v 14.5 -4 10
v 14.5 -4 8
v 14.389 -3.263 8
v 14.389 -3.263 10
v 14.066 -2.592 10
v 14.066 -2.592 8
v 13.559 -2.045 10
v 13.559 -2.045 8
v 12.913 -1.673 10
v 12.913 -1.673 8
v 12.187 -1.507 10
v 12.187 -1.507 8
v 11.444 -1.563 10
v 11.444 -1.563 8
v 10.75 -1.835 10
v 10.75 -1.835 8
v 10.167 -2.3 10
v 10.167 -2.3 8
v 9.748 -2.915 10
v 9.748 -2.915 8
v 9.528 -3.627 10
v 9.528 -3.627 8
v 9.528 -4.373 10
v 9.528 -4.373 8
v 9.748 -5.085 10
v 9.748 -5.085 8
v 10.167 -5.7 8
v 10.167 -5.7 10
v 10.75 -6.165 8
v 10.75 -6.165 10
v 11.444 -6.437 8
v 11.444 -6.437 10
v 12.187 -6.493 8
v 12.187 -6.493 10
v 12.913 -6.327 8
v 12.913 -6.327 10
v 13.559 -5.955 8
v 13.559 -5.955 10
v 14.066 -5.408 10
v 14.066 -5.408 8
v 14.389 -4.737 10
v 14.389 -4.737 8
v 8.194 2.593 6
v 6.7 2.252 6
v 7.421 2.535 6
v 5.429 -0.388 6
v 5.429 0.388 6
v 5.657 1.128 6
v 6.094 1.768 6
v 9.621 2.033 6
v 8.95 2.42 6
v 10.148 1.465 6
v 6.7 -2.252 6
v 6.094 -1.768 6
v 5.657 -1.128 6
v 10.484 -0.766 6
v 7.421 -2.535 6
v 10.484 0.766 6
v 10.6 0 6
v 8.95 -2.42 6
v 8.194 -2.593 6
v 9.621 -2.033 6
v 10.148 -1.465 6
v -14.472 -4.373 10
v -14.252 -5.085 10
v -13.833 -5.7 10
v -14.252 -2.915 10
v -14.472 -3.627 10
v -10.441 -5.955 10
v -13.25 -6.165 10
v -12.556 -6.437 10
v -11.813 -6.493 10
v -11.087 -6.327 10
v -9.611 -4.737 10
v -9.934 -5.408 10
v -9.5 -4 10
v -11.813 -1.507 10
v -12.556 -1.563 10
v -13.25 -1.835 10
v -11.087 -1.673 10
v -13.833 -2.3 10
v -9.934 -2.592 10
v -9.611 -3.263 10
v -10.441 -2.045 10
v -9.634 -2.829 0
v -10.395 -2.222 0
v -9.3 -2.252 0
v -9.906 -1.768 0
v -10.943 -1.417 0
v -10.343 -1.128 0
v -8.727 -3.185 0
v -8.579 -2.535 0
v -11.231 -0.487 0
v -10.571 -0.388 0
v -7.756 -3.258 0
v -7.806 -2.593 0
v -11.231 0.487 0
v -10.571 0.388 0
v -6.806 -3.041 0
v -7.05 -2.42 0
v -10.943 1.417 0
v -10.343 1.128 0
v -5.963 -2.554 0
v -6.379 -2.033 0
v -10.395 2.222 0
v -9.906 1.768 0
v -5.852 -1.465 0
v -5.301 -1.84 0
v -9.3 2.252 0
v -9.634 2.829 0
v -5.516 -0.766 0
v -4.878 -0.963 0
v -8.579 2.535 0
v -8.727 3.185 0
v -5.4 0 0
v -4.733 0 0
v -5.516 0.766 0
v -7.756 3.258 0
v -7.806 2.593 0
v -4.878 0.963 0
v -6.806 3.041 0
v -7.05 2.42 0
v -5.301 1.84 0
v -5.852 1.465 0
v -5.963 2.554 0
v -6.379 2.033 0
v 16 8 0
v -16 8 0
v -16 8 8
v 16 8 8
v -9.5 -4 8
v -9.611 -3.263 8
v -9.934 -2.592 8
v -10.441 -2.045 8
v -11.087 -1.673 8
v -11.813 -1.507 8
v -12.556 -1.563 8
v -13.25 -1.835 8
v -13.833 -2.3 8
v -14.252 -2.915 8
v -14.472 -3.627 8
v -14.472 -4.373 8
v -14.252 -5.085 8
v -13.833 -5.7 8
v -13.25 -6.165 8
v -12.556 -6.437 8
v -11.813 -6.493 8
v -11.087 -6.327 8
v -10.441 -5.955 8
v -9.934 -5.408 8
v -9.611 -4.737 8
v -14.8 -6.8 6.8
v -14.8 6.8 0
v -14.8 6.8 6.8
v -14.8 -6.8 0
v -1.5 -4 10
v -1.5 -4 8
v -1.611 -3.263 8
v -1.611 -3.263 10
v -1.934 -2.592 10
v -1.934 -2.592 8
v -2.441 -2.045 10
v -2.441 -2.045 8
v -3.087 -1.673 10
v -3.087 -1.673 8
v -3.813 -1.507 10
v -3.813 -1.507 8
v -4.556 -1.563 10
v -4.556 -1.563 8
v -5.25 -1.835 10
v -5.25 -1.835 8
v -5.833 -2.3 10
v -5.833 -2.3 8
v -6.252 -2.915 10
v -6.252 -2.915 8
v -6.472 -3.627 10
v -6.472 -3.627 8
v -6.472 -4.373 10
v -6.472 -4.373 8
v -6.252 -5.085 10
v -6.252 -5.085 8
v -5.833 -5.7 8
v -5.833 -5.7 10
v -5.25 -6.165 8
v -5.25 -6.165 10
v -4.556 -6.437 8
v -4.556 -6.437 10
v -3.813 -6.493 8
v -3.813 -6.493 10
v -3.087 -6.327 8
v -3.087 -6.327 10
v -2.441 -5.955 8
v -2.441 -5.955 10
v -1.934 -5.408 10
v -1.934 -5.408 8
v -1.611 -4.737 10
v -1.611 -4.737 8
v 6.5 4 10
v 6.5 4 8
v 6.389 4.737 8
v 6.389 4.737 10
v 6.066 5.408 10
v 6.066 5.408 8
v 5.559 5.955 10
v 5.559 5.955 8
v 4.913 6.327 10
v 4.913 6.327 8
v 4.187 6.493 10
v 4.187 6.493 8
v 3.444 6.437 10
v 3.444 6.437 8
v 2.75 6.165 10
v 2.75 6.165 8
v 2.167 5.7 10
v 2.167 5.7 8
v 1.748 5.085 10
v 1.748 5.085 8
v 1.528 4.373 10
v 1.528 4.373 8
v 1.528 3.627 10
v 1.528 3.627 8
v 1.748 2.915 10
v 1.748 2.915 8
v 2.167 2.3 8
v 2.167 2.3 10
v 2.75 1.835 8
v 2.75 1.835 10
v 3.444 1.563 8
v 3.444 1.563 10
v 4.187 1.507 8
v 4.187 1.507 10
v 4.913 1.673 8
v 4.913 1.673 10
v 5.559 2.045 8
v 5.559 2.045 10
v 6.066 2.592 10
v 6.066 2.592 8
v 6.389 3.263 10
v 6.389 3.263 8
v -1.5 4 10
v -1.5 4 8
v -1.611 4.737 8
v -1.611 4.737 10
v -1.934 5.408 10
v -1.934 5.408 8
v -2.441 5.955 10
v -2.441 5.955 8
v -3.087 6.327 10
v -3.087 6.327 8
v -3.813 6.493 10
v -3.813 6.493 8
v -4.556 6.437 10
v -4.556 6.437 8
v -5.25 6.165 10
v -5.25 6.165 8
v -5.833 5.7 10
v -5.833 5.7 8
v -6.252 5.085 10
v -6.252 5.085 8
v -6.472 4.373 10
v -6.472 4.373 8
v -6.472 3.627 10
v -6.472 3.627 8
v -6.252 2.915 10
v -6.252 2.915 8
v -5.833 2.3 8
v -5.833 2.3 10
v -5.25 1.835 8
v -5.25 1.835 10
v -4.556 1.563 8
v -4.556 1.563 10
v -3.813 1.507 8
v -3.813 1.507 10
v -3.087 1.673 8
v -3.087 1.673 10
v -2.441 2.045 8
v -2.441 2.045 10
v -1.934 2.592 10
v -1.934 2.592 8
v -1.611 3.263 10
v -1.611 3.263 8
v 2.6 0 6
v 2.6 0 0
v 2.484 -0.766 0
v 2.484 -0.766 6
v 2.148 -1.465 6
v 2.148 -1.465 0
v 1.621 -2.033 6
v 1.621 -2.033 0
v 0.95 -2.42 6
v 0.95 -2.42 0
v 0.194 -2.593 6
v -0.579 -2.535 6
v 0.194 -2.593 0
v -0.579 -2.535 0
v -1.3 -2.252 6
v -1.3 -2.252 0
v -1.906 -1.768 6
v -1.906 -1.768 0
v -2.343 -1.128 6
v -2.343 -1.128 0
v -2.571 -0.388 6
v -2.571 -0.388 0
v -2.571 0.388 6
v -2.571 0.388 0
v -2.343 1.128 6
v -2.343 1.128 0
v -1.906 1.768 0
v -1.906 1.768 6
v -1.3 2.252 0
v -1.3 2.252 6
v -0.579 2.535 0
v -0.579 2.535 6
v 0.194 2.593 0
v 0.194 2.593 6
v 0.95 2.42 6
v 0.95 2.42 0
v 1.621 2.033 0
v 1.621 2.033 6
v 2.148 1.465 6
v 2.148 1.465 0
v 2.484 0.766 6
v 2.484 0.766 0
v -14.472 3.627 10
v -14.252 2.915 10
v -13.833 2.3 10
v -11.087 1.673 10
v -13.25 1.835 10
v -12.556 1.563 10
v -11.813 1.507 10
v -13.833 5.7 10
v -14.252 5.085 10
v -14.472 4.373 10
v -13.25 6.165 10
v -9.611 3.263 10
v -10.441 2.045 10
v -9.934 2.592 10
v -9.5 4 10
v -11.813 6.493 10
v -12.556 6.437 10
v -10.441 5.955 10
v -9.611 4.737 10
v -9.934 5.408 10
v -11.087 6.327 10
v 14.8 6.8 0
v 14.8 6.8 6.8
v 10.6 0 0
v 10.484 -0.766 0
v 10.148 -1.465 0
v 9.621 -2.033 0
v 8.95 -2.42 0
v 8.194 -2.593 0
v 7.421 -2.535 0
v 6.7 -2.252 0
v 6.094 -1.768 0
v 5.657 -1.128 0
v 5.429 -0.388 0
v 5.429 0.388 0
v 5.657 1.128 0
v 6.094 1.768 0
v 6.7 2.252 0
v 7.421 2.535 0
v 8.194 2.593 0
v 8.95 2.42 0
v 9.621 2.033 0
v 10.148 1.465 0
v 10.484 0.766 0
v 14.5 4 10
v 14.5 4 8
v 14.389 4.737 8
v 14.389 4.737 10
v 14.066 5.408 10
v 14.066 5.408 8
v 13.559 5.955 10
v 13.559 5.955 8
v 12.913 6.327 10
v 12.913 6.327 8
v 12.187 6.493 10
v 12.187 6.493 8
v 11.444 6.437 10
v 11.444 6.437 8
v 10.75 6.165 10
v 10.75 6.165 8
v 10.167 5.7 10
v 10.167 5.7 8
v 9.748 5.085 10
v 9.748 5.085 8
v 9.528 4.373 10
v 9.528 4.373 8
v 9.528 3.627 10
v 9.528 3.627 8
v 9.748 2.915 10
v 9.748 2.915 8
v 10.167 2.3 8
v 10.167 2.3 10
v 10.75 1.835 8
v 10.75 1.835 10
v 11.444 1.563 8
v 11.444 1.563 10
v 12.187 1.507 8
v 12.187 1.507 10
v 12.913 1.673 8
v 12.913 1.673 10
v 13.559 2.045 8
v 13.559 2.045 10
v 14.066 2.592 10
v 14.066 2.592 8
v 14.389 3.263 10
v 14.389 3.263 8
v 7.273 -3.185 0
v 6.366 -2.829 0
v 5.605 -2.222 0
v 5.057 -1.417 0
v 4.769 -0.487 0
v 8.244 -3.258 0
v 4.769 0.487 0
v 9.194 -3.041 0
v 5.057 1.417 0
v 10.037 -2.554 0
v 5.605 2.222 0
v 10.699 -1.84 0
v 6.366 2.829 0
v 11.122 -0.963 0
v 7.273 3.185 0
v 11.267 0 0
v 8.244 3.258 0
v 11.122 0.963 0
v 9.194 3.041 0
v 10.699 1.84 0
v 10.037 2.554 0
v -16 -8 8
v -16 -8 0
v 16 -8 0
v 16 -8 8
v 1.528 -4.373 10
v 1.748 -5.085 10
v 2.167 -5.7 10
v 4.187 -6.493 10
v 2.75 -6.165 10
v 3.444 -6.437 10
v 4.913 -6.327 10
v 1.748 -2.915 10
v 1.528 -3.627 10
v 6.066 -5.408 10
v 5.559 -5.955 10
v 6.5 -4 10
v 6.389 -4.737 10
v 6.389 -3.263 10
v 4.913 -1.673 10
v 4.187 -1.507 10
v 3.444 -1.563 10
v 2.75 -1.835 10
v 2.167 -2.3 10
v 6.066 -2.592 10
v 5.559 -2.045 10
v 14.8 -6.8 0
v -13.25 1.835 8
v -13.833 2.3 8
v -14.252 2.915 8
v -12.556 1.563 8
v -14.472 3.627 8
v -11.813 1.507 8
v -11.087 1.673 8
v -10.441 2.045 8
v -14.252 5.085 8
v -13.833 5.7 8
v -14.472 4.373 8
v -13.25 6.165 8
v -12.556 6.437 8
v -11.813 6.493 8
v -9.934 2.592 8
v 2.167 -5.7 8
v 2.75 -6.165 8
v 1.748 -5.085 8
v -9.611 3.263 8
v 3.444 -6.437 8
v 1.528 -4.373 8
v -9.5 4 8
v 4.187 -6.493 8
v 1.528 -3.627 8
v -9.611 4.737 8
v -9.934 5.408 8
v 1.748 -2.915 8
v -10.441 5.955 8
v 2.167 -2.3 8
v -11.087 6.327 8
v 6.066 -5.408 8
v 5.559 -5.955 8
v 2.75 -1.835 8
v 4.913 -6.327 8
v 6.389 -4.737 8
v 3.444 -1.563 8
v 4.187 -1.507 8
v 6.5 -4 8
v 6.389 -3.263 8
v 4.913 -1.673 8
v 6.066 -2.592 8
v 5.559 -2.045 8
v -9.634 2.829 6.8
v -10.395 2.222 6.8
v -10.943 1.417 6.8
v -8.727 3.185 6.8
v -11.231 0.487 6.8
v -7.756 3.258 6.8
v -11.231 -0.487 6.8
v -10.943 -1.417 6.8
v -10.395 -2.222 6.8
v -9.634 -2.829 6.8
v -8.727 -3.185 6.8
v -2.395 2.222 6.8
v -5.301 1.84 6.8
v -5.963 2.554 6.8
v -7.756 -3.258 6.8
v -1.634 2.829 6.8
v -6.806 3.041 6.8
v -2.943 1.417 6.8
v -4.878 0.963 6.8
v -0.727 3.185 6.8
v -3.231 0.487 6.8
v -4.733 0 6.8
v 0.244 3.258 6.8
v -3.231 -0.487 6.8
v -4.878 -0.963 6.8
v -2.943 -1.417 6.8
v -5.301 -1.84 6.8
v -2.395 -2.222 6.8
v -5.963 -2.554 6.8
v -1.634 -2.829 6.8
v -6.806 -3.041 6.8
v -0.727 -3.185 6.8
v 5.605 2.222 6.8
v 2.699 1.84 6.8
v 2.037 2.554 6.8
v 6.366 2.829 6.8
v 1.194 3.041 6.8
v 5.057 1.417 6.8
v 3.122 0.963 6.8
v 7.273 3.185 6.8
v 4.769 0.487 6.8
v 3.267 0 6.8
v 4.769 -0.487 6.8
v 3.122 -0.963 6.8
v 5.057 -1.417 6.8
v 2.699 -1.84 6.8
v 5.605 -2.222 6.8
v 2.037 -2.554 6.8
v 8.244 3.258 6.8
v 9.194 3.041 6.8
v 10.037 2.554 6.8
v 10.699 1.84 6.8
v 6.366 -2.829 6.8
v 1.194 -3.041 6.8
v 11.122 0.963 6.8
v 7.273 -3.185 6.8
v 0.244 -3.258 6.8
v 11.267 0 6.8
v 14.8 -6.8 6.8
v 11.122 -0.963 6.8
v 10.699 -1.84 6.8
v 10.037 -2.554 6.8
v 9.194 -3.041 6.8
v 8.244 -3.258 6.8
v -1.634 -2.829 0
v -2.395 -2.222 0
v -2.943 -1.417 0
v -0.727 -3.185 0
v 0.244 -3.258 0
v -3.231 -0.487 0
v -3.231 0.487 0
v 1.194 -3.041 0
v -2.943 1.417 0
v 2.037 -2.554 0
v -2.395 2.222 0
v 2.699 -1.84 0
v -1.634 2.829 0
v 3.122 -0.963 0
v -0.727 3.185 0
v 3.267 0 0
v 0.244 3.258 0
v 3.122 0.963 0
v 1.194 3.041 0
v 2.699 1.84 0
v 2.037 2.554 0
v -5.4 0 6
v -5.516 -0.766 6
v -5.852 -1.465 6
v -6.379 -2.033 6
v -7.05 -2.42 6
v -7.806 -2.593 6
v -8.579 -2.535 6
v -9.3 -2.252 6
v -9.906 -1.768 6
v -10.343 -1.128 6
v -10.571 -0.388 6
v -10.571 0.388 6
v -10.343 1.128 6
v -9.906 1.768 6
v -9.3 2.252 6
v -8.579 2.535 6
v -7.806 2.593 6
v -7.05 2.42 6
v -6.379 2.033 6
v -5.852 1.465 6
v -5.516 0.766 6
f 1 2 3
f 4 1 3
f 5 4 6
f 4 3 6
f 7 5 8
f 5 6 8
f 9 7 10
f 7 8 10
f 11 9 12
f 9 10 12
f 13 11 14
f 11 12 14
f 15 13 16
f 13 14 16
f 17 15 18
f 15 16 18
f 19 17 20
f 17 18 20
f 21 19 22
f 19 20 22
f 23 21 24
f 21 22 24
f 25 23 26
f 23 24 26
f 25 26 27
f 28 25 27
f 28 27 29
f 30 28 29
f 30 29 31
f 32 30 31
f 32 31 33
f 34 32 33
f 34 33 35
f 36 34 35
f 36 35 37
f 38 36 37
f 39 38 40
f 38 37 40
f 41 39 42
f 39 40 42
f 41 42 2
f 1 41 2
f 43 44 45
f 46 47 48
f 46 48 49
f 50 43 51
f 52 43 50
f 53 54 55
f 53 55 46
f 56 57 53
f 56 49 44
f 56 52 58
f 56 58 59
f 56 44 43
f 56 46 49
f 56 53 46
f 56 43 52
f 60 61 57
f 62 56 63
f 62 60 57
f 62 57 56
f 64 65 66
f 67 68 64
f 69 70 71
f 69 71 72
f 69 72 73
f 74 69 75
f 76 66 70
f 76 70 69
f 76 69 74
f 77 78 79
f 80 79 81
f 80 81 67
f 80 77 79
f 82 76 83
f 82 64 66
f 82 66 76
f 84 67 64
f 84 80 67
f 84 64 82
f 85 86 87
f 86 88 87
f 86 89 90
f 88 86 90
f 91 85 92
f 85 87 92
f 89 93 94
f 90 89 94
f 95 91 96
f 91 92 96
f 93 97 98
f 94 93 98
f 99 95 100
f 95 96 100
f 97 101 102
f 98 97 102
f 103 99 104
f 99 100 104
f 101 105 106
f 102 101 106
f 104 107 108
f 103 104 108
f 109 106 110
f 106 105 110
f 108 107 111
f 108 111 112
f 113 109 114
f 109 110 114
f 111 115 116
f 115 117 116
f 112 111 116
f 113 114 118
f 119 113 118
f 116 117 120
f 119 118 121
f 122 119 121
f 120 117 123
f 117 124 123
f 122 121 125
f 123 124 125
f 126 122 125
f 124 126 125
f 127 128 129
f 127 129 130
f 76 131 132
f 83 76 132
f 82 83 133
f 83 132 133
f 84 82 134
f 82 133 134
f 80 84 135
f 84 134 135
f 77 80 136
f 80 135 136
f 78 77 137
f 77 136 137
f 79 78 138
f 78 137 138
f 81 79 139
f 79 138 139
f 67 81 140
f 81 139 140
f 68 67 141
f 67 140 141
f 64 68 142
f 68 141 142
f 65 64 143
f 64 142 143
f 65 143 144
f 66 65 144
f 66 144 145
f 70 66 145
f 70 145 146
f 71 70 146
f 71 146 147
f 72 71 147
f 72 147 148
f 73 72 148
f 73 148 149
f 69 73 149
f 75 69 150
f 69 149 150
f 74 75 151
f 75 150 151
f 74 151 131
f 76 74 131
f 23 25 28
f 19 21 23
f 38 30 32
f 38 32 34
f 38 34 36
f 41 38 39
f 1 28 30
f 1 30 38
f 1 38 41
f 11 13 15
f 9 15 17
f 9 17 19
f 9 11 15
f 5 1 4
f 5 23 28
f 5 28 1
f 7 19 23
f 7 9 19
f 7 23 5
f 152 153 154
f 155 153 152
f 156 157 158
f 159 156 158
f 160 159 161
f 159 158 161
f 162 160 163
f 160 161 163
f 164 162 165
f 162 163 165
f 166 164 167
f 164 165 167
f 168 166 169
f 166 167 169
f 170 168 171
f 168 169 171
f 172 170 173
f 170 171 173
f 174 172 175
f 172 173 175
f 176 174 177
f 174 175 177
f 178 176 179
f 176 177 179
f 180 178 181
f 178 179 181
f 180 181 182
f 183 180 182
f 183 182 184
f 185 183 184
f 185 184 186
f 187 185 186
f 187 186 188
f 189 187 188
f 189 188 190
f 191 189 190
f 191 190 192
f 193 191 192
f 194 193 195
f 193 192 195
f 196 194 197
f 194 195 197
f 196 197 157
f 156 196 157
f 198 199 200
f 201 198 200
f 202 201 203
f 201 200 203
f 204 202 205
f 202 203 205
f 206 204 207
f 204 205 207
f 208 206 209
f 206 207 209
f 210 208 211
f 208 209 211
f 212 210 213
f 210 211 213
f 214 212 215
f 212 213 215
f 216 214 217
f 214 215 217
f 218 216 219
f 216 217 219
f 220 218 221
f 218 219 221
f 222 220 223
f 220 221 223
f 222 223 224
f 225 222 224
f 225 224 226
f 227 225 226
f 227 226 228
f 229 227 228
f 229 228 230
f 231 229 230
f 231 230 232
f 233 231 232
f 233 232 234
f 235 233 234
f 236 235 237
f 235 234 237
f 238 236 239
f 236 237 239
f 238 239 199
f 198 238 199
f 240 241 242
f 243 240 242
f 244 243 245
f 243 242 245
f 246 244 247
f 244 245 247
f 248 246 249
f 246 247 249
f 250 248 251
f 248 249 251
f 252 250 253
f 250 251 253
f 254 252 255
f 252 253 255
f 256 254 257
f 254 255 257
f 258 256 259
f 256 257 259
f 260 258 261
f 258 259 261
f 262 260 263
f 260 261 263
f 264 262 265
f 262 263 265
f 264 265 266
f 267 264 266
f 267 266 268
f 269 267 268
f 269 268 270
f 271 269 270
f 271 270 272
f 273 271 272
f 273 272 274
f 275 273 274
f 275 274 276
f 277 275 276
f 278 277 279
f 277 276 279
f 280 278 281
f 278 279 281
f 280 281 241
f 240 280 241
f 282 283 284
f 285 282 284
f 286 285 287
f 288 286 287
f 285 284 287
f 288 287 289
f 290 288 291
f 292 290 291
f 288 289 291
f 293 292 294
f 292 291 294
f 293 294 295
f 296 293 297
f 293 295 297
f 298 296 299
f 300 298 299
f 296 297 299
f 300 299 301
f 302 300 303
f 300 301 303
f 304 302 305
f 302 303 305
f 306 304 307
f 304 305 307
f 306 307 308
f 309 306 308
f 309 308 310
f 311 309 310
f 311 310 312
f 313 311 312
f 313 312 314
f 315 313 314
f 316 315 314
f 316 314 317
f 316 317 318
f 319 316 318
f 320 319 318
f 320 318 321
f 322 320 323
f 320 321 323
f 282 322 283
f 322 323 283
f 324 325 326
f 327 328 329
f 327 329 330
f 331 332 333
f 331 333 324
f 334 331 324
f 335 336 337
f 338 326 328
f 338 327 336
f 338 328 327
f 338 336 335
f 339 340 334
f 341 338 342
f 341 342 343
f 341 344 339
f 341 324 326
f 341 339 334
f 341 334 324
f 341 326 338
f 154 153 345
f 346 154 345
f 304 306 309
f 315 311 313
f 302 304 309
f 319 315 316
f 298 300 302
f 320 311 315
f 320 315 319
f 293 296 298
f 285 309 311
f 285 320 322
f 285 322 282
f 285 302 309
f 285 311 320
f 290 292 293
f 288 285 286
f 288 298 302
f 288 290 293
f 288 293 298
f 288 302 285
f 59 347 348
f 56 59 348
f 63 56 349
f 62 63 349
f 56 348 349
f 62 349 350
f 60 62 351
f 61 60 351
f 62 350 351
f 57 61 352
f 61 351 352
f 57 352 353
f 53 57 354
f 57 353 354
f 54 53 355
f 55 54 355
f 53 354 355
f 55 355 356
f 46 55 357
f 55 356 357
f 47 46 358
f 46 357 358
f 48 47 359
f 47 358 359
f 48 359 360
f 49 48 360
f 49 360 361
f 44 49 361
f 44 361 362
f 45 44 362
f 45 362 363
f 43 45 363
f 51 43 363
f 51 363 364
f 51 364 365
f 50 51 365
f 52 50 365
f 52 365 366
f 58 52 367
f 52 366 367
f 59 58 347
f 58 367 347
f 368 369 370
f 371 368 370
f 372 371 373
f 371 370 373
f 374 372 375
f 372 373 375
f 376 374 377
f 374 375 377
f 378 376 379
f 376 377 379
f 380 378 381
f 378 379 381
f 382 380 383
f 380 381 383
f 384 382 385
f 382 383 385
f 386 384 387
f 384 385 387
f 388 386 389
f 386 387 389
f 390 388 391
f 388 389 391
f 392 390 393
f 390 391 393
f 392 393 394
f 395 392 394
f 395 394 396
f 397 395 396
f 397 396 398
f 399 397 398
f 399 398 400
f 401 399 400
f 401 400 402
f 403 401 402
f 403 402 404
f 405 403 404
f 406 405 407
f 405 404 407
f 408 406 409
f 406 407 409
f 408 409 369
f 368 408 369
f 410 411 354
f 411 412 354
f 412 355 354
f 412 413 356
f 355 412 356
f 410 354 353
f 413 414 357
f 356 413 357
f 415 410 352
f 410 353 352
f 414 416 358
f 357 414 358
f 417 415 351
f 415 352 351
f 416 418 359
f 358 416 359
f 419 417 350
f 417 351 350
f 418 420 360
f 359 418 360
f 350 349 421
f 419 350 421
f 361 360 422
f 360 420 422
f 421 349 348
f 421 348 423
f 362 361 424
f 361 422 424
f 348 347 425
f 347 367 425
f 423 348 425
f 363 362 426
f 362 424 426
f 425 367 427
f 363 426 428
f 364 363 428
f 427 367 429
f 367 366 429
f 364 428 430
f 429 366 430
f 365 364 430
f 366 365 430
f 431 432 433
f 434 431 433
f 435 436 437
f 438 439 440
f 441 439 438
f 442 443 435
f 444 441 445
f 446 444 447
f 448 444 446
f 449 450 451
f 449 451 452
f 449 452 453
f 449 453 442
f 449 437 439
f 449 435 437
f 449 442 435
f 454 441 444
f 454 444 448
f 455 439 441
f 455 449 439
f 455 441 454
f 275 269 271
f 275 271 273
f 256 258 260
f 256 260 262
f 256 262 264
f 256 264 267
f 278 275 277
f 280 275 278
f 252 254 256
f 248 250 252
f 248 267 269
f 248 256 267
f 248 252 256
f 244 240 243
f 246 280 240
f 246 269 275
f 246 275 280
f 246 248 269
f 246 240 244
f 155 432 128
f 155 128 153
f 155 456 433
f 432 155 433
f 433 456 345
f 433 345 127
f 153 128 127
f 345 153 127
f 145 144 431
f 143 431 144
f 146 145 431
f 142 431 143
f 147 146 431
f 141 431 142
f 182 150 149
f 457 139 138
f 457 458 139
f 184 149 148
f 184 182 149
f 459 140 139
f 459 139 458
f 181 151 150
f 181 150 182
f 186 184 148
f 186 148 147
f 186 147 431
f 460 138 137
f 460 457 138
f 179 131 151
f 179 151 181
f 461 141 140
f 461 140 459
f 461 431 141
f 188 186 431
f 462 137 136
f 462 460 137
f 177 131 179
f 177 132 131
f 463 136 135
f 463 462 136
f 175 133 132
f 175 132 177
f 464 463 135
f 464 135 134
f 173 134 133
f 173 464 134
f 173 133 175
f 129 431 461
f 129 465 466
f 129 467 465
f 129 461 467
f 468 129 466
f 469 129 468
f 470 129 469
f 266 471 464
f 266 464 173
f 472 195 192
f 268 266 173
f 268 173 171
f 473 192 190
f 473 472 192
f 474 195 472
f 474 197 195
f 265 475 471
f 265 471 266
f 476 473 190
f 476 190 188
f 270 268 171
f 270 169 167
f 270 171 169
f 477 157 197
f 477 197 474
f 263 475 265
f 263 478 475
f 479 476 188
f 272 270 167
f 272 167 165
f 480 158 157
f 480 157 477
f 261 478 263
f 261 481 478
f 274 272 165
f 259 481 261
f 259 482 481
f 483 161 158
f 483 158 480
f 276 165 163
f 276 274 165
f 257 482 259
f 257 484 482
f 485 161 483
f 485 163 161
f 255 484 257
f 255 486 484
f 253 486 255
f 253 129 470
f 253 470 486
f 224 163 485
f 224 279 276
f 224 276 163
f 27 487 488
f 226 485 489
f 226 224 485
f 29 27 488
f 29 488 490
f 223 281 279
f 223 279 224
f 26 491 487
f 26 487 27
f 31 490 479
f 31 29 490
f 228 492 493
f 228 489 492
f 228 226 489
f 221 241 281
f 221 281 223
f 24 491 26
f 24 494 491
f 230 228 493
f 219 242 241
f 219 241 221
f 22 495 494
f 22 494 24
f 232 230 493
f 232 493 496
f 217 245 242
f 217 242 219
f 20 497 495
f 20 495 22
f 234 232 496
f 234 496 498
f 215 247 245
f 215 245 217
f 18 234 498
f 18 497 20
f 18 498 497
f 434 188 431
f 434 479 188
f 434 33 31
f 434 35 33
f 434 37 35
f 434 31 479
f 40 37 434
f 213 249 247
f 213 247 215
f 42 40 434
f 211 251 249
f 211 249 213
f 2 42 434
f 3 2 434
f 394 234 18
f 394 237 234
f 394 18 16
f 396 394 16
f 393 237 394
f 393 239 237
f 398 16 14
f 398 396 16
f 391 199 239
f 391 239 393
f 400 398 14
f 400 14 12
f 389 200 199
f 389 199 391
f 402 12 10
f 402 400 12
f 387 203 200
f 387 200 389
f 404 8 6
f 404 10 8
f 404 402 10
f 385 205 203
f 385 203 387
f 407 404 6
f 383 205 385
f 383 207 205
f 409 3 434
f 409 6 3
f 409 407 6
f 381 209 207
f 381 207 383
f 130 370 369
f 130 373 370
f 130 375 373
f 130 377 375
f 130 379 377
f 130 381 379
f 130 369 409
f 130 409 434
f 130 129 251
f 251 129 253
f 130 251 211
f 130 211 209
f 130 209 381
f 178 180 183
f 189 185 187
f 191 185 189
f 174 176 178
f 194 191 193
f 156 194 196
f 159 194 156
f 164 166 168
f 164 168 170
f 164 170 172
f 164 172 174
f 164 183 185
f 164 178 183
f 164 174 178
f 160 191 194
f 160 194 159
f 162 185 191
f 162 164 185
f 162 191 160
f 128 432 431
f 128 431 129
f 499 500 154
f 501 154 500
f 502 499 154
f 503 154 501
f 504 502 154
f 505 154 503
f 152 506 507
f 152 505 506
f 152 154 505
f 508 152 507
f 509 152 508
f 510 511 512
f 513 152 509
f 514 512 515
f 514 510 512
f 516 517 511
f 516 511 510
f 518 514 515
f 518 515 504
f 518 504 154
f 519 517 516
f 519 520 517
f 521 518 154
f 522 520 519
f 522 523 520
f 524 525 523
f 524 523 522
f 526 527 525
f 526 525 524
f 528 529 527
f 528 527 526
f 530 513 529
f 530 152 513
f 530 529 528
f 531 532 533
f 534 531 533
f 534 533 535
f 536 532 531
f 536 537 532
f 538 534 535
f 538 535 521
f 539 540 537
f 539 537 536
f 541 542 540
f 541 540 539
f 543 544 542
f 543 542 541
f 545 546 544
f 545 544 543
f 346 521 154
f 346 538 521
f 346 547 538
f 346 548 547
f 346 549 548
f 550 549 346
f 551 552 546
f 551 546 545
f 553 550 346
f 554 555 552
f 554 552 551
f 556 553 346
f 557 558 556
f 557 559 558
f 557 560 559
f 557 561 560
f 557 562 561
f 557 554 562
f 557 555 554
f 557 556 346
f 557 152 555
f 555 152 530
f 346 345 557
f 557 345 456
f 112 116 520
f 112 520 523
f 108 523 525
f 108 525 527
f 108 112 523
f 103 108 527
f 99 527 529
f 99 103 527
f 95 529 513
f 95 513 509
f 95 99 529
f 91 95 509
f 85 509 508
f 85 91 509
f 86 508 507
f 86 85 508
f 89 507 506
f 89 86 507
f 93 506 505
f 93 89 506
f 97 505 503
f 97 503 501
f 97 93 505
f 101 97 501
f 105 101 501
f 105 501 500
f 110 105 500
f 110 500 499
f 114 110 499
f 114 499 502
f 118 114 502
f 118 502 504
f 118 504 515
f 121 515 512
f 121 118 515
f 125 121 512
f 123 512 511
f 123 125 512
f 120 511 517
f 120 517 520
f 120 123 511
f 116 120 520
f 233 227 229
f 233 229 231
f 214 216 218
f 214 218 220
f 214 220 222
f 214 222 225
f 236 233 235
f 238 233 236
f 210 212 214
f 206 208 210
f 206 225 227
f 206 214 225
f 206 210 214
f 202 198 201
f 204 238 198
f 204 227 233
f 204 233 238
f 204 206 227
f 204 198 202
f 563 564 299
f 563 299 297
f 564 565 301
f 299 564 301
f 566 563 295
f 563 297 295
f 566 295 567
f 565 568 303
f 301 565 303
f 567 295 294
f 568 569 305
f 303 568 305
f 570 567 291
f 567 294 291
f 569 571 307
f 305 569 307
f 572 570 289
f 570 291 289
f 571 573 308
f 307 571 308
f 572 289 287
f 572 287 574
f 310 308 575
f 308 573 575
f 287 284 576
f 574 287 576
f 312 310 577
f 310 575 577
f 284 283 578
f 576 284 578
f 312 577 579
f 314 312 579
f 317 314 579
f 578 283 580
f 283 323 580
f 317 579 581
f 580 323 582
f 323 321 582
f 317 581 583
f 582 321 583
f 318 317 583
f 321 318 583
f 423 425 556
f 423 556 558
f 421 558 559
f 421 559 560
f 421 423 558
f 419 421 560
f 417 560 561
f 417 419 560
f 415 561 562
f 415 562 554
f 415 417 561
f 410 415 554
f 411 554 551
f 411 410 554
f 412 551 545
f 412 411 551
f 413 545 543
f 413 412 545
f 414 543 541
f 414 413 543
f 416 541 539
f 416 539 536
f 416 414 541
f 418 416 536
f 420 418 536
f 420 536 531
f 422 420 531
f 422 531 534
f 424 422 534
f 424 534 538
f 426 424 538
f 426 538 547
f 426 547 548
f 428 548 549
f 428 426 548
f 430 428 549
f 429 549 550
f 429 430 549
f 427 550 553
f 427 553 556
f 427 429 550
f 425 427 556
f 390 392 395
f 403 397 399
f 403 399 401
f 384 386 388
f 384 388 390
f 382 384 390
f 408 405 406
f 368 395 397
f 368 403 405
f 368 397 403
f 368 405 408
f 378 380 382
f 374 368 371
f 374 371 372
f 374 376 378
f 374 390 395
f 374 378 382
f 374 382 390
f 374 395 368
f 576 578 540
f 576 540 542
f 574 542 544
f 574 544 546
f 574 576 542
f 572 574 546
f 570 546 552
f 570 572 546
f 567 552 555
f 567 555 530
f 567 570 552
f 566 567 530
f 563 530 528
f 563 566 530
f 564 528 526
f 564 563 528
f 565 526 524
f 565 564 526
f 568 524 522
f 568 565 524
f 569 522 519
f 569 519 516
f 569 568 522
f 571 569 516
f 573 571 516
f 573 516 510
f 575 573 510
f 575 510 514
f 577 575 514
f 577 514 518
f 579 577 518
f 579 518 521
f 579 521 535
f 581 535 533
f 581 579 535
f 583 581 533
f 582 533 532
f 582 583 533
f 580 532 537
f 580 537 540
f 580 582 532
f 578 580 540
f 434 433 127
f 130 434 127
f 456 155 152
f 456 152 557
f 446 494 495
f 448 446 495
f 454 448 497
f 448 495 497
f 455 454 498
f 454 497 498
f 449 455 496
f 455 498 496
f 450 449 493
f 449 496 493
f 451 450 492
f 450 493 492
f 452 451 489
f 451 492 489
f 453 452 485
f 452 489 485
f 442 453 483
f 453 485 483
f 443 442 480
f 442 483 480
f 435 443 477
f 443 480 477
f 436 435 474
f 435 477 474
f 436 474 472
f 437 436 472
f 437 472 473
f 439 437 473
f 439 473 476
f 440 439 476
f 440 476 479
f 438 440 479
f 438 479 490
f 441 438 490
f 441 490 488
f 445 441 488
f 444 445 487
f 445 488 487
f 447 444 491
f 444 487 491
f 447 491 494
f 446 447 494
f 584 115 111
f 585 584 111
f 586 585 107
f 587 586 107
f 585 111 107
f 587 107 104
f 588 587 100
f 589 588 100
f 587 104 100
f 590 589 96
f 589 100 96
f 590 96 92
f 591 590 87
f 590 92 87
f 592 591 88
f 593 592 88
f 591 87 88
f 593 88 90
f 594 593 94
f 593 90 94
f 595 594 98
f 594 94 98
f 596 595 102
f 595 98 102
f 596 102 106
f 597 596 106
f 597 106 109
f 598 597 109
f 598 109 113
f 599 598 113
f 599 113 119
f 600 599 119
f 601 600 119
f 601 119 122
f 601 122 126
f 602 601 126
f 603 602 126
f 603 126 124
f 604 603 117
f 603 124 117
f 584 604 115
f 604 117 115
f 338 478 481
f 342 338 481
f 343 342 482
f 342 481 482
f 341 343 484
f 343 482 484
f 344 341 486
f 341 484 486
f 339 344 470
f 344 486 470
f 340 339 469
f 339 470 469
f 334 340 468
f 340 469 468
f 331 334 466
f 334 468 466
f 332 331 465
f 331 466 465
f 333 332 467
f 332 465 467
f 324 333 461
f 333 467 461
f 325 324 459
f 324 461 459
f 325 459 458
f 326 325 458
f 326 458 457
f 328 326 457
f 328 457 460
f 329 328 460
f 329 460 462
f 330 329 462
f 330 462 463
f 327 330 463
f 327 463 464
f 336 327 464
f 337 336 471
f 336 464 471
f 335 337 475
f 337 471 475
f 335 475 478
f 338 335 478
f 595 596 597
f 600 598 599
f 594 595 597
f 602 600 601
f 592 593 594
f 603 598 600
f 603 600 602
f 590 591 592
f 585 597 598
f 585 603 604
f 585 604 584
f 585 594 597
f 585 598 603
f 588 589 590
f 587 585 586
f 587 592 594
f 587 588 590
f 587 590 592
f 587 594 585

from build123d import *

# Parameters (mm, degrees)
F0_W     = 32
F0_H     = 16
F1_DEPTH = 8
F2_R     = 2.5
F3_DEPTH = 2
F4_W     = 29.6
F4_H     = 13.6
F4_R     = 3.267
F5_DEPTH = 6.8
F6_R     = 2.6
F7_DEPTH = 6
F8_R     = 2.6
F9_DEPTH = 6


with BuildPart() as f1:
    # F0 (on Top) → F1 (new body)
    with BuildSketch(Plane.XY):
        Rectangle(F0_W, F0_H)
    extrude(amount=F1_DEPTH)

    # F2 (on face) → F3 (join)
    with BuildSketch(Plane.XY.offset(8)):
        with Locations((-12, 4)):
            Circle(F2_R)
        with Locations((-4, 4)):
            Circle(F2_R)
        with Locations((4, 4)):
            Circle(F2_R)
        with Locations((12, 4)):
            Circle(F2_R)
        with Locations((12, -4)):
            Circle(F2_R)
        with Locations((4, -4)):
            Circle(F2_R)
        with Locations((-4, -4)):
            Circle(F2_R)
        with Locations((-12, -4)):
            Circle(F2_R)
    extrude(amount=F3_DEPTH)

    # F4 (on face) → F5 (cut)
    with BuildSketch(Plane(origin=(0, 0, 0), x_dir=(1, 0, 0), z_dir=(0, 0, -1))):
        Rectangle(F4_W, F4_H)
        with Locations((-8, 0)):
            Circle(F4_R, mode=Mode.SUBTRACT)
        Circle(F4_R, mode=Mode.SUBTRACT)
        with Locations((8, 0)):
            Circle(F4_R, mode=Mode.SUBTRACT)
    extrude(amount=-F5_DEPTH, mode=Mode.SUBTRACT)

    # F6 (on face) → F7 (cut)
    with BuildSketch(Plane(origin=(0, 0, 0), x_dir=(1, 0, 0), z_dir=(0, 0, -1))):
        Circle(F6_R)
        with Locations((8, 0)):
            Circle(F6_R)
    extrude(amount=-F7_DEPTH, mode=Mode.SUBTRACT)

    # F8 (on face) → F9 (cut)
    with BuildSketch(Plane(origin=(0, 0, 0), x_dir=(1, 0, 0), z_dir=(0, 0, -1))):
        with Locations((-8, 0)):
            Circle(F8_R)
    extrude(amount=-F9_DEPTH, mode=Mode.SUBTRACT)


solid = f1.part
